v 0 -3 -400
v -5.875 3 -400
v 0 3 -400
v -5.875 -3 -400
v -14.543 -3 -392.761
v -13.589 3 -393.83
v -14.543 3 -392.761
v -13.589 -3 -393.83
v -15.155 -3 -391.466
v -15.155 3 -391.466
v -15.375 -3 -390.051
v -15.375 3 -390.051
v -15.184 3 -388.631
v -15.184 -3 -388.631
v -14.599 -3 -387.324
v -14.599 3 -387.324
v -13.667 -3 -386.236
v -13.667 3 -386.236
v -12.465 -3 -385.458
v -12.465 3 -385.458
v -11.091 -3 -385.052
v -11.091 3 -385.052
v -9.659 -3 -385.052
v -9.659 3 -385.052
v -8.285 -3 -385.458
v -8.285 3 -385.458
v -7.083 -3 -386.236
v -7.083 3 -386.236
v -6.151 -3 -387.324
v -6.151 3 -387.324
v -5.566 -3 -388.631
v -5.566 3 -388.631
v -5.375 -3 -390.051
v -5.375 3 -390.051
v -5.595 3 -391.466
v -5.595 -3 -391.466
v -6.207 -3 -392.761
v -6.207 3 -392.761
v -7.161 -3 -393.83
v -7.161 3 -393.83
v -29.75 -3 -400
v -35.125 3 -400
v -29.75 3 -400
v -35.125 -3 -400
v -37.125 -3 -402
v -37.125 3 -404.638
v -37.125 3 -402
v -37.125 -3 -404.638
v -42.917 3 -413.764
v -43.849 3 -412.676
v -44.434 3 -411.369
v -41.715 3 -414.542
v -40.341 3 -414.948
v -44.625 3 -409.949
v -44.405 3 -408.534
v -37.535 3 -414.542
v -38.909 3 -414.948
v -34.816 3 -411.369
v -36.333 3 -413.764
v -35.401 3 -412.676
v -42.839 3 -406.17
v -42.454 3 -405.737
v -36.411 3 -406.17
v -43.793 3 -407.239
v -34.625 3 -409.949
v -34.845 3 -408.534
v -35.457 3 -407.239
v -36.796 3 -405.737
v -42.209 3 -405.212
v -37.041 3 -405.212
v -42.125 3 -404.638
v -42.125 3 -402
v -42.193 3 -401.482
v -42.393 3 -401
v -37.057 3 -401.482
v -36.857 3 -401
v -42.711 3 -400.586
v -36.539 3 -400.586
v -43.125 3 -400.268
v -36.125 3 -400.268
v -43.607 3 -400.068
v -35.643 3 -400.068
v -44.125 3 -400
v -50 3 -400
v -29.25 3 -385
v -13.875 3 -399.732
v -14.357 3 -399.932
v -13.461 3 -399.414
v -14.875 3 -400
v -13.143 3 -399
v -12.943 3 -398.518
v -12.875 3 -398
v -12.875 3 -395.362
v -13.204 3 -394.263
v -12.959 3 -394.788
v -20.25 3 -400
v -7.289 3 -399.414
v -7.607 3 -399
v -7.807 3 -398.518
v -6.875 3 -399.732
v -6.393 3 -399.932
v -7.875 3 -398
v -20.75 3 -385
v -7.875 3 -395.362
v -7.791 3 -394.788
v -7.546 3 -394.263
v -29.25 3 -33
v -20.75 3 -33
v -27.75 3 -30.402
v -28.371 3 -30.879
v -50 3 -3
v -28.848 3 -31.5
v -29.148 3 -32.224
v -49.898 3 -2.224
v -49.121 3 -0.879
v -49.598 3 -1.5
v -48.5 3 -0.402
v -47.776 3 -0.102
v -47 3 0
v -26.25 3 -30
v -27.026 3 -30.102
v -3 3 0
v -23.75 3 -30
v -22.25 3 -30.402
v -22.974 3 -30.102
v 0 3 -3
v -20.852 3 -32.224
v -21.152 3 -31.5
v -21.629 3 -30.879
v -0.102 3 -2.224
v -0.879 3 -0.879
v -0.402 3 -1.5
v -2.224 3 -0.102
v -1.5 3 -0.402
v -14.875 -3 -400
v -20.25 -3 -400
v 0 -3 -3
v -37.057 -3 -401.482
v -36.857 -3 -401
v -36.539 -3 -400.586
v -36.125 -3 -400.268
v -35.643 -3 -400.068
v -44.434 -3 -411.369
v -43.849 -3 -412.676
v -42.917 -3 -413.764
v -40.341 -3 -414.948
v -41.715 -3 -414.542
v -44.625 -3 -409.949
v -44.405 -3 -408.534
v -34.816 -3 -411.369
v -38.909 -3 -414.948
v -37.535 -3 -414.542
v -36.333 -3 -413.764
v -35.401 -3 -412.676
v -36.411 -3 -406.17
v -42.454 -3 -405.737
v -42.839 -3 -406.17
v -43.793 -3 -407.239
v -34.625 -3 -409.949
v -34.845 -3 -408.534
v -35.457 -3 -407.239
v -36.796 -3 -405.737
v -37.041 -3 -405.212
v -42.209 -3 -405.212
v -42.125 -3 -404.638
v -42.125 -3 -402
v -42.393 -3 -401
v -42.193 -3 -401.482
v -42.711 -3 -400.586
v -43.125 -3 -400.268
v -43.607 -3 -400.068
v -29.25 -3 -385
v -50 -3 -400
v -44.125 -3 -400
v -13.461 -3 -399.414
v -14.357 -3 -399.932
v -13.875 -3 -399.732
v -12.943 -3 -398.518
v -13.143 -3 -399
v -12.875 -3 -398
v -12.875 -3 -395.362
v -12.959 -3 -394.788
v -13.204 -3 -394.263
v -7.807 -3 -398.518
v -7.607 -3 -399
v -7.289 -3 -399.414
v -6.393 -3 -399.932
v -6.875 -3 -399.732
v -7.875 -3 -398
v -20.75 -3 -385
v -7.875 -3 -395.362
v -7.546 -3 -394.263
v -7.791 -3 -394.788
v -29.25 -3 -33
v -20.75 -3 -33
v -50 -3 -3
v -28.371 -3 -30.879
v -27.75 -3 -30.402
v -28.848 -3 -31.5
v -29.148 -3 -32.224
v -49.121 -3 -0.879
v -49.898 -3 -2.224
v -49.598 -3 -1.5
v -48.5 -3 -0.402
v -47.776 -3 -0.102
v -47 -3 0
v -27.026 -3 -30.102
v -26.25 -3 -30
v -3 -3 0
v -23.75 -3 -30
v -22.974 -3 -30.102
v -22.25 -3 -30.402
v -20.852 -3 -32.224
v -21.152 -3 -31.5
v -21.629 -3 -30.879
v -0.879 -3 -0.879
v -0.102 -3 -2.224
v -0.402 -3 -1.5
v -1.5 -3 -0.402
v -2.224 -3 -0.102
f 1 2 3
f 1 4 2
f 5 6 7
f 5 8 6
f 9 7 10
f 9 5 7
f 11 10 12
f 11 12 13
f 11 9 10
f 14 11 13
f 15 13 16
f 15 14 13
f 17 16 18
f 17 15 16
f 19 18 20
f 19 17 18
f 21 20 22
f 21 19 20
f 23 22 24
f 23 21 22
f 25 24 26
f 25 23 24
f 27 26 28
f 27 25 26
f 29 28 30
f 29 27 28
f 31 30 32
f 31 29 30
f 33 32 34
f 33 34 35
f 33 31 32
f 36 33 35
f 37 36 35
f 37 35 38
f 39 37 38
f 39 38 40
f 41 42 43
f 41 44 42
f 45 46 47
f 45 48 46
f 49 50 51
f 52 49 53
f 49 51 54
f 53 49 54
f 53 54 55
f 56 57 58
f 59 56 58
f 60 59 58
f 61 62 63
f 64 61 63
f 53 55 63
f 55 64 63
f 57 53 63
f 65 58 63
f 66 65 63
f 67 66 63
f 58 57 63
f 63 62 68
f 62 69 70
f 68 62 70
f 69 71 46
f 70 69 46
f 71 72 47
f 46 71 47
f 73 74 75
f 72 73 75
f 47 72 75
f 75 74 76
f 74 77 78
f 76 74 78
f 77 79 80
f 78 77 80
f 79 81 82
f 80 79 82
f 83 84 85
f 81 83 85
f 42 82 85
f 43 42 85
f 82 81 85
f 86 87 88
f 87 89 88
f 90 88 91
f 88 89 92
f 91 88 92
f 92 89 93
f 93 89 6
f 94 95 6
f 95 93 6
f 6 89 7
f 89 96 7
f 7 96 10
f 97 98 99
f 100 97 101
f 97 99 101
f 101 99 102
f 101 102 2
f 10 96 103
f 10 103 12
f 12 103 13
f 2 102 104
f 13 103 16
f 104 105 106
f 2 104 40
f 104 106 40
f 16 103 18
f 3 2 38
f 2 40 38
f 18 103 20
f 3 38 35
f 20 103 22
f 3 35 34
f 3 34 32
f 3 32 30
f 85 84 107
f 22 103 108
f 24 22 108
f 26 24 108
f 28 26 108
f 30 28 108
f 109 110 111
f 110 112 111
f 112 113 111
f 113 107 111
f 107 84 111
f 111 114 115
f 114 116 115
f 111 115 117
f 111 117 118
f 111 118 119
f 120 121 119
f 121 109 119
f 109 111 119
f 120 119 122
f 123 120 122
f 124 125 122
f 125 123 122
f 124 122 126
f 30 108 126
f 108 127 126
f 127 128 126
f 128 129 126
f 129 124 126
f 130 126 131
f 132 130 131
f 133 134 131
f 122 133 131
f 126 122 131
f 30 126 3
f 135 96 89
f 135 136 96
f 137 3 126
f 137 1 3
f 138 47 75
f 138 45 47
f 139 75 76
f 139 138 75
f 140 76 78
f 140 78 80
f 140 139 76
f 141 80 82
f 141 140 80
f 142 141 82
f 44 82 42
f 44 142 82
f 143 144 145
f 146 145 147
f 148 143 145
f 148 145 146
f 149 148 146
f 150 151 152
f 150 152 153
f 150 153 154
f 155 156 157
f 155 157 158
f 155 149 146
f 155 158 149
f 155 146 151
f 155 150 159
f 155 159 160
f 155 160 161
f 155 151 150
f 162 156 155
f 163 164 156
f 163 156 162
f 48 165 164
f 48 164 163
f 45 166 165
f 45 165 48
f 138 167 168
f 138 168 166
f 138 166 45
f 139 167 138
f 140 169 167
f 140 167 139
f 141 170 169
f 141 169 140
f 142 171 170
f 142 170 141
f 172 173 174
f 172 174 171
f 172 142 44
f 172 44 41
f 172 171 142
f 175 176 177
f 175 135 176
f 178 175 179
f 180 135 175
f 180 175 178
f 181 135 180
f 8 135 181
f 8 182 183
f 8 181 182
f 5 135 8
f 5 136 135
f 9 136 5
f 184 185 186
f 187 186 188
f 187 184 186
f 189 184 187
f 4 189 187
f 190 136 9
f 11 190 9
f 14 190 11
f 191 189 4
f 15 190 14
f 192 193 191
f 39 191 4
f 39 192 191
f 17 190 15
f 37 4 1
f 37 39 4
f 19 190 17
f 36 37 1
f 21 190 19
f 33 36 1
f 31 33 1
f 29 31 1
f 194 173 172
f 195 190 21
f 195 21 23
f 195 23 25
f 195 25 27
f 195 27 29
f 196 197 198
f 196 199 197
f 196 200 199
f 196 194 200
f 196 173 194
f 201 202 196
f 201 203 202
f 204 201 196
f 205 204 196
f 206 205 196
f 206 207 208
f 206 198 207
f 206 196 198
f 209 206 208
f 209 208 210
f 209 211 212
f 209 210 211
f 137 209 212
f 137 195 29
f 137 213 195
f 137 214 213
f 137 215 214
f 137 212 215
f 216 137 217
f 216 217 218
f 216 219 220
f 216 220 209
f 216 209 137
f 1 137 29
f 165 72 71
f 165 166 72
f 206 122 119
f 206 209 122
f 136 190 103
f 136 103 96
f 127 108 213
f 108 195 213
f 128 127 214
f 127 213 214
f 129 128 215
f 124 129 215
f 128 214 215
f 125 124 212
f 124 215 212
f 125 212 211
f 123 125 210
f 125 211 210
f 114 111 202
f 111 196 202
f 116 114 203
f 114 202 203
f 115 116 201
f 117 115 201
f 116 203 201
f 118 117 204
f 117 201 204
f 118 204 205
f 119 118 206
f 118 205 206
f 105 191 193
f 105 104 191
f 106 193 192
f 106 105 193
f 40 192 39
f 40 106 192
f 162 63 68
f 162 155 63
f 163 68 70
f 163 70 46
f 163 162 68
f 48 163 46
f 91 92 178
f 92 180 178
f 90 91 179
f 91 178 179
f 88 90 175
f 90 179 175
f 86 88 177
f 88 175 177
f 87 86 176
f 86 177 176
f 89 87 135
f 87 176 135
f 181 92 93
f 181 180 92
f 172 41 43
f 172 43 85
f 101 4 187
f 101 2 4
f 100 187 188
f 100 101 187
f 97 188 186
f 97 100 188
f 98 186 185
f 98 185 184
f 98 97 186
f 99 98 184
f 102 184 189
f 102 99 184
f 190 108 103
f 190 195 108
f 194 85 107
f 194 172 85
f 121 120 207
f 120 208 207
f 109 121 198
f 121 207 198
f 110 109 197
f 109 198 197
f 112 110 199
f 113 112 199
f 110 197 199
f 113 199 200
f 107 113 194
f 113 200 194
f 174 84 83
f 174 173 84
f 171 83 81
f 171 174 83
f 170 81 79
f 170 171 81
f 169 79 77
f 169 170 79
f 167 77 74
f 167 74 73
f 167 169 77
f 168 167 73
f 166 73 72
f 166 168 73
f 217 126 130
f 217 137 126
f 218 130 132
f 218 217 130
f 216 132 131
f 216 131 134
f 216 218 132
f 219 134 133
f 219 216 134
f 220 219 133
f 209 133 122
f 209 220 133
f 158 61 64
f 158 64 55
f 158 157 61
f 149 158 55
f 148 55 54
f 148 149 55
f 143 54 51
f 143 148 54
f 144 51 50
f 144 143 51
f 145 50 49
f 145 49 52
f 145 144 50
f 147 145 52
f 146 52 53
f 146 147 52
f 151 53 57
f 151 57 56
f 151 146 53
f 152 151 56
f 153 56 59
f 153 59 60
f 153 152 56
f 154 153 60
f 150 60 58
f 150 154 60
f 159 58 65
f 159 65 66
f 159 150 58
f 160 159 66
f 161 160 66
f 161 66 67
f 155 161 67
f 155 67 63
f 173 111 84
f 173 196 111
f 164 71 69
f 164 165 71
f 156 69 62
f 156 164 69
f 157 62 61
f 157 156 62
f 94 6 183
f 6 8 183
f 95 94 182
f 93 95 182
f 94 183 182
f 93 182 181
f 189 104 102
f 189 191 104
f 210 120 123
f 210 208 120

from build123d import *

# Parameters (mm, degrees)
F3_DEPTH = 3
F4_R     = 3
F5_R     = 2


with BuildPart() as f3:
    # F0 (on Front) → F3 (new body, symmetric)
    with BuildSketch(Plane.XZ):
        with BuildLine():
            Line((0, -400), (0, 0))
            Line((0, 0), (-50, 0))
            Line((-50, 0), (-50, -400))
            Line((-50, -400), (-42.125, -400))
            Line((-42.125, -400), (-42.125, -405.6698729811))
            ThreePointArc((-42.125, -405.6698729811), (-39.625, -415), (-37.125, -405.6698729811))
            Line((-37.125, -405.6698729811), (-37.125, -400))
            Line((-37.125, -400), (-29.75, -400))
            Line((-29.75, -400), (-29.25, -385))
            Line((-29.25, -385), (-29.25, -30))
            Line((-29.25, -30), (-20.75, -30))
            Line((-20.75, -30), (-20.75, -385))
            Line((-20.75, -385), (-20.25, -400))
            Line((-20.25, -400), (-12.875, -400))
            Line((-12.875, -400), (-12.875, -394.3301270189))
            ThreePointArc((-12.875, -394.3301270189), (-10.375, -385), (-7.875, -394.3301270189))
            Line((-7.875, -394.3301270189), (-7.875, -400))
            Line((-7.875, -400), (0, -400))
        make_face()
    extrude(amount=F3_DEPTH, both=True)

    # F4
    f4_edges = [f3.edges().sort_by_distance(p)[0] for p in [
        (-50, 0, 0),
        (0, 0, 0),
        (-20.75, 0, -30),
        (-29.25, 0, -30),
    ]]
    fillet(f4_edges, radius=F4_R)

    # F5
    f5_edges = [f3.edges().sort_by_distance(p)[0] for p in [
        (-12.875, 0, -394.330127),
        (-12.875, 0, -400),
        (-37.125, 0, -400),
        (-7.875, 0, -400),
        (-7.875, 0, -394.330127),
        (-42.125, 0, -400),
        (-42.125, 0, -405.669873),
        (-37.125, 0, -405.669873),
    ]]
    fillet(f5_edges, radius=F5_R)


solid = f3.part
